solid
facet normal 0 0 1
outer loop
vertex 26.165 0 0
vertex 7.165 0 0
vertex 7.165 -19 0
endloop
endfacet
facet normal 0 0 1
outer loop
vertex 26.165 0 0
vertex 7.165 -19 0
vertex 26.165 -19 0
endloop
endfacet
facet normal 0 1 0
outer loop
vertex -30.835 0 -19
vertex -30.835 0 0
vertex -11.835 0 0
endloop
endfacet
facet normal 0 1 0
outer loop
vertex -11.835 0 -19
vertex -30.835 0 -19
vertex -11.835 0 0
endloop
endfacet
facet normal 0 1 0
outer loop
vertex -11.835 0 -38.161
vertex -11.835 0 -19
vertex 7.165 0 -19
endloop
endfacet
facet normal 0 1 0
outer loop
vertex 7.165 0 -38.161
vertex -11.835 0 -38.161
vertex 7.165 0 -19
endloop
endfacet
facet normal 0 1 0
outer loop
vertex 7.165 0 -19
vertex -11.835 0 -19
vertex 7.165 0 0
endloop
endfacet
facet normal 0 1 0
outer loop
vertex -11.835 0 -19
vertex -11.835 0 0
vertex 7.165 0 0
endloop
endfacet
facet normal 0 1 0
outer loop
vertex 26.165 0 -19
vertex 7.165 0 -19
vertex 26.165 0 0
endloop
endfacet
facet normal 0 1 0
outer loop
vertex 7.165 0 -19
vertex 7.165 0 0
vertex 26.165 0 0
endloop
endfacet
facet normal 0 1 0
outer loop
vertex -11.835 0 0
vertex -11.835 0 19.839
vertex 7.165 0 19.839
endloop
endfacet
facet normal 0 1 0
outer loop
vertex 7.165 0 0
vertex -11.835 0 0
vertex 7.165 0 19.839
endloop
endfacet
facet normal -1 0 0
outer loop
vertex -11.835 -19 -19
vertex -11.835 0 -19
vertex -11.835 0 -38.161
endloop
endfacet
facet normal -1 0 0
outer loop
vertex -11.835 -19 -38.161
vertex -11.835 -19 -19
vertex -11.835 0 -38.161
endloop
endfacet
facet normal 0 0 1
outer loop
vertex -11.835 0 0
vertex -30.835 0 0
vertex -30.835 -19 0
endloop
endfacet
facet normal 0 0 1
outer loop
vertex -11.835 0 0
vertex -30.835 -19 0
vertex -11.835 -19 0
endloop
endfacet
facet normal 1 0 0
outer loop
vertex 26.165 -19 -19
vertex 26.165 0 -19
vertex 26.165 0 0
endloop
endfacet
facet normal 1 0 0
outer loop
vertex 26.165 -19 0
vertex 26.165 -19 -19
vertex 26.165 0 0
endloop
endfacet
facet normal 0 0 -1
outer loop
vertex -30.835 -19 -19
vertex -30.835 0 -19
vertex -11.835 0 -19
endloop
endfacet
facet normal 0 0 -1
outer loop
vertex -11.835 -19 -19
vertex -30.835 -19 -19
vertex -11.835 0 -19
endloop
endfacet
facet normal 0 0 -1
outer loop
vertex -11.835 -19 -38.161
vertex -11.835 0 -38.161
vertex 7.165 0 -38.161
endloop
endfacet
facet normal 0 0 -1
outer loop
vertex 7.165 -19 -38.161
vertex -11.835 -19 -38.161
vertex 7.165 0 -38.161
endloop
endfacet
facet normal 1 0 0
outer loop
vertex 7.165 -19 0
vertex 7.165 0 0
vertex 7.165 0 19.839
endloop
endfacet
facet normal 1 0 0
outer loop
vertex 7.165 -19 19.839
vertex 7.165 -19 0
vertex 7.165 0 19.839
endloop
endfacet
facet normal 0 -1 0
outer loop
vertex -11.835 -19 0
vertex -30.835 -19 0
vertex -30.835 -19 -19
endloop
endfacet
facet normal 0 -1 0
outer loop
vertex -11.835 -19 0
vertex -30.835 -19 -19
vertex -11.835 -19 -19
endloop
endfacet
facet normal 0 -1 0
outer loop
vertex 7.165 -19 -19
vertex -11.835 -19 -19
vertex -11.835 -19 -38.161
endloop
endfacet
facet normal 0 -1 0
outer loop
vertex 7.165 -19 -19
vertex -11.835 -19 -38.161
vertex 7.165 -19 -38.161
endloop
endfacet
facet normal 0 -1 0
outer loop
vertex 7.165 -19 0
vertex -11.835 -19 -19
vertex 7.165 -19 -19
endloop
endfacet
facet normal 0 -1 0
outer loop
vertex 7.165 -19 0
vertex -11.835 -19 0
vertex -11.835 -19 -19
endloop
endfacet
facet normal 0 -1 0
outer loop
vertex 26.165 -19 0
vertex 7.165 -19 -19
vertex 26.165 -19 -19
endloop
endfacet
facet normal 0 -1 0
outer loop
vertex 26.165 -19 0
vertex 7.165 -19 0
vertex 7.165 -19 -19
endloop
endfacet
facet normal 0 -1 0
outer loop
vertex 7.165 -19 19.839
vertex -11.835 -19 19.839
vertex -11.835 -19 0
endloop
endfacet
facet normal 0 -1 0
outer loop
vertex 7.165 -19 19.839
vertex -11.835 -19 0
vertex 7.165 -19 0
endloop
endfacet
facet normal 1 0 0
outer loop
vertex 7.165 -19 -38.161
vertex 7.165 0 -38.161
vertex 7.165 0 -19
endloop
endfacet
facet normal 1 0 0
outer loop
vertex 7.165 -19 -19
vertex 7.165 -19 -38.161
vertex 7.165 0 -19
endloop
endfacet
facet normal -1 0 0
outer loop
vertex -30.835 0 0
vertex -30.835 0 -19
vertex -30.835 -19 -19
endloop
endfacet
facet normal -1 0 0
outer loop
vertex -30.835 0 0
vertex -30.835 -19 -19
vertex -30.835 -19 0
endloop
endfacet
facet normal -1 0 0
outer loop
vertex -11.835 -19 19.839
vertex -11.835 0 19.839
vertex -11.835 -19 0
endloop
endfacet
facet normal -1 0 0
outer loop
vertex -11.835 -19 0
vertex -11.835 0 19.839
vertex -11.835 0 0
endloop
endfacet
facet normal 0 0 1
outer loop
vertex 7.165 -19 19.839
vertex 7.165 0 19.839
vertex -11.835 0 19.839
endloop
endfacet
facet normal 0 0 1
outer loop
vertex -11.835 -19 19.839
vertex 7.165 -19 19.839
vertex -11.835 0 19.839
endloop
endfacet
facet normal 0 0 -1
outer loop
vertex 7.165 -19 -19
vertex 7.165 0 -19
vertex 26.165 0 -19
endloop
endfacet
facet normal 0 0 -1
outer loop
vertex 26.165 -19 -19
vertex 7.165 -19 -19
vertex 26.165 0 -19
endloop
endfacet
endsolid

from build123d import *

# Parameters (mm, degrees)
F0_W     = 19
F0_H     = 19
F1_DEPTH = 19


with BuildPart() as f1:
    # F0 (on Front) → F1 (new body)
    with BuildSketch(Plane.XZ):
        Polygon((7.165254, 19.838981), (-11.834746, 19.838981), (-11.834746, 0), (-11.834746, -19), (-11.834746, -38.161019), (-2.334746, -38.161019), (7.165254, -38.161019), (7.165254, -19), (7.165254, 0), align=None)
        with Locations((-21.334746, -9.5)):
            Rectangle(F0_W, F0_H)
        with Locations((16.665254, -9.5)):
            Rectangle(F0_W, F0_H)
    extrude(amount=F1_DEPTH)


solid = f1.part
